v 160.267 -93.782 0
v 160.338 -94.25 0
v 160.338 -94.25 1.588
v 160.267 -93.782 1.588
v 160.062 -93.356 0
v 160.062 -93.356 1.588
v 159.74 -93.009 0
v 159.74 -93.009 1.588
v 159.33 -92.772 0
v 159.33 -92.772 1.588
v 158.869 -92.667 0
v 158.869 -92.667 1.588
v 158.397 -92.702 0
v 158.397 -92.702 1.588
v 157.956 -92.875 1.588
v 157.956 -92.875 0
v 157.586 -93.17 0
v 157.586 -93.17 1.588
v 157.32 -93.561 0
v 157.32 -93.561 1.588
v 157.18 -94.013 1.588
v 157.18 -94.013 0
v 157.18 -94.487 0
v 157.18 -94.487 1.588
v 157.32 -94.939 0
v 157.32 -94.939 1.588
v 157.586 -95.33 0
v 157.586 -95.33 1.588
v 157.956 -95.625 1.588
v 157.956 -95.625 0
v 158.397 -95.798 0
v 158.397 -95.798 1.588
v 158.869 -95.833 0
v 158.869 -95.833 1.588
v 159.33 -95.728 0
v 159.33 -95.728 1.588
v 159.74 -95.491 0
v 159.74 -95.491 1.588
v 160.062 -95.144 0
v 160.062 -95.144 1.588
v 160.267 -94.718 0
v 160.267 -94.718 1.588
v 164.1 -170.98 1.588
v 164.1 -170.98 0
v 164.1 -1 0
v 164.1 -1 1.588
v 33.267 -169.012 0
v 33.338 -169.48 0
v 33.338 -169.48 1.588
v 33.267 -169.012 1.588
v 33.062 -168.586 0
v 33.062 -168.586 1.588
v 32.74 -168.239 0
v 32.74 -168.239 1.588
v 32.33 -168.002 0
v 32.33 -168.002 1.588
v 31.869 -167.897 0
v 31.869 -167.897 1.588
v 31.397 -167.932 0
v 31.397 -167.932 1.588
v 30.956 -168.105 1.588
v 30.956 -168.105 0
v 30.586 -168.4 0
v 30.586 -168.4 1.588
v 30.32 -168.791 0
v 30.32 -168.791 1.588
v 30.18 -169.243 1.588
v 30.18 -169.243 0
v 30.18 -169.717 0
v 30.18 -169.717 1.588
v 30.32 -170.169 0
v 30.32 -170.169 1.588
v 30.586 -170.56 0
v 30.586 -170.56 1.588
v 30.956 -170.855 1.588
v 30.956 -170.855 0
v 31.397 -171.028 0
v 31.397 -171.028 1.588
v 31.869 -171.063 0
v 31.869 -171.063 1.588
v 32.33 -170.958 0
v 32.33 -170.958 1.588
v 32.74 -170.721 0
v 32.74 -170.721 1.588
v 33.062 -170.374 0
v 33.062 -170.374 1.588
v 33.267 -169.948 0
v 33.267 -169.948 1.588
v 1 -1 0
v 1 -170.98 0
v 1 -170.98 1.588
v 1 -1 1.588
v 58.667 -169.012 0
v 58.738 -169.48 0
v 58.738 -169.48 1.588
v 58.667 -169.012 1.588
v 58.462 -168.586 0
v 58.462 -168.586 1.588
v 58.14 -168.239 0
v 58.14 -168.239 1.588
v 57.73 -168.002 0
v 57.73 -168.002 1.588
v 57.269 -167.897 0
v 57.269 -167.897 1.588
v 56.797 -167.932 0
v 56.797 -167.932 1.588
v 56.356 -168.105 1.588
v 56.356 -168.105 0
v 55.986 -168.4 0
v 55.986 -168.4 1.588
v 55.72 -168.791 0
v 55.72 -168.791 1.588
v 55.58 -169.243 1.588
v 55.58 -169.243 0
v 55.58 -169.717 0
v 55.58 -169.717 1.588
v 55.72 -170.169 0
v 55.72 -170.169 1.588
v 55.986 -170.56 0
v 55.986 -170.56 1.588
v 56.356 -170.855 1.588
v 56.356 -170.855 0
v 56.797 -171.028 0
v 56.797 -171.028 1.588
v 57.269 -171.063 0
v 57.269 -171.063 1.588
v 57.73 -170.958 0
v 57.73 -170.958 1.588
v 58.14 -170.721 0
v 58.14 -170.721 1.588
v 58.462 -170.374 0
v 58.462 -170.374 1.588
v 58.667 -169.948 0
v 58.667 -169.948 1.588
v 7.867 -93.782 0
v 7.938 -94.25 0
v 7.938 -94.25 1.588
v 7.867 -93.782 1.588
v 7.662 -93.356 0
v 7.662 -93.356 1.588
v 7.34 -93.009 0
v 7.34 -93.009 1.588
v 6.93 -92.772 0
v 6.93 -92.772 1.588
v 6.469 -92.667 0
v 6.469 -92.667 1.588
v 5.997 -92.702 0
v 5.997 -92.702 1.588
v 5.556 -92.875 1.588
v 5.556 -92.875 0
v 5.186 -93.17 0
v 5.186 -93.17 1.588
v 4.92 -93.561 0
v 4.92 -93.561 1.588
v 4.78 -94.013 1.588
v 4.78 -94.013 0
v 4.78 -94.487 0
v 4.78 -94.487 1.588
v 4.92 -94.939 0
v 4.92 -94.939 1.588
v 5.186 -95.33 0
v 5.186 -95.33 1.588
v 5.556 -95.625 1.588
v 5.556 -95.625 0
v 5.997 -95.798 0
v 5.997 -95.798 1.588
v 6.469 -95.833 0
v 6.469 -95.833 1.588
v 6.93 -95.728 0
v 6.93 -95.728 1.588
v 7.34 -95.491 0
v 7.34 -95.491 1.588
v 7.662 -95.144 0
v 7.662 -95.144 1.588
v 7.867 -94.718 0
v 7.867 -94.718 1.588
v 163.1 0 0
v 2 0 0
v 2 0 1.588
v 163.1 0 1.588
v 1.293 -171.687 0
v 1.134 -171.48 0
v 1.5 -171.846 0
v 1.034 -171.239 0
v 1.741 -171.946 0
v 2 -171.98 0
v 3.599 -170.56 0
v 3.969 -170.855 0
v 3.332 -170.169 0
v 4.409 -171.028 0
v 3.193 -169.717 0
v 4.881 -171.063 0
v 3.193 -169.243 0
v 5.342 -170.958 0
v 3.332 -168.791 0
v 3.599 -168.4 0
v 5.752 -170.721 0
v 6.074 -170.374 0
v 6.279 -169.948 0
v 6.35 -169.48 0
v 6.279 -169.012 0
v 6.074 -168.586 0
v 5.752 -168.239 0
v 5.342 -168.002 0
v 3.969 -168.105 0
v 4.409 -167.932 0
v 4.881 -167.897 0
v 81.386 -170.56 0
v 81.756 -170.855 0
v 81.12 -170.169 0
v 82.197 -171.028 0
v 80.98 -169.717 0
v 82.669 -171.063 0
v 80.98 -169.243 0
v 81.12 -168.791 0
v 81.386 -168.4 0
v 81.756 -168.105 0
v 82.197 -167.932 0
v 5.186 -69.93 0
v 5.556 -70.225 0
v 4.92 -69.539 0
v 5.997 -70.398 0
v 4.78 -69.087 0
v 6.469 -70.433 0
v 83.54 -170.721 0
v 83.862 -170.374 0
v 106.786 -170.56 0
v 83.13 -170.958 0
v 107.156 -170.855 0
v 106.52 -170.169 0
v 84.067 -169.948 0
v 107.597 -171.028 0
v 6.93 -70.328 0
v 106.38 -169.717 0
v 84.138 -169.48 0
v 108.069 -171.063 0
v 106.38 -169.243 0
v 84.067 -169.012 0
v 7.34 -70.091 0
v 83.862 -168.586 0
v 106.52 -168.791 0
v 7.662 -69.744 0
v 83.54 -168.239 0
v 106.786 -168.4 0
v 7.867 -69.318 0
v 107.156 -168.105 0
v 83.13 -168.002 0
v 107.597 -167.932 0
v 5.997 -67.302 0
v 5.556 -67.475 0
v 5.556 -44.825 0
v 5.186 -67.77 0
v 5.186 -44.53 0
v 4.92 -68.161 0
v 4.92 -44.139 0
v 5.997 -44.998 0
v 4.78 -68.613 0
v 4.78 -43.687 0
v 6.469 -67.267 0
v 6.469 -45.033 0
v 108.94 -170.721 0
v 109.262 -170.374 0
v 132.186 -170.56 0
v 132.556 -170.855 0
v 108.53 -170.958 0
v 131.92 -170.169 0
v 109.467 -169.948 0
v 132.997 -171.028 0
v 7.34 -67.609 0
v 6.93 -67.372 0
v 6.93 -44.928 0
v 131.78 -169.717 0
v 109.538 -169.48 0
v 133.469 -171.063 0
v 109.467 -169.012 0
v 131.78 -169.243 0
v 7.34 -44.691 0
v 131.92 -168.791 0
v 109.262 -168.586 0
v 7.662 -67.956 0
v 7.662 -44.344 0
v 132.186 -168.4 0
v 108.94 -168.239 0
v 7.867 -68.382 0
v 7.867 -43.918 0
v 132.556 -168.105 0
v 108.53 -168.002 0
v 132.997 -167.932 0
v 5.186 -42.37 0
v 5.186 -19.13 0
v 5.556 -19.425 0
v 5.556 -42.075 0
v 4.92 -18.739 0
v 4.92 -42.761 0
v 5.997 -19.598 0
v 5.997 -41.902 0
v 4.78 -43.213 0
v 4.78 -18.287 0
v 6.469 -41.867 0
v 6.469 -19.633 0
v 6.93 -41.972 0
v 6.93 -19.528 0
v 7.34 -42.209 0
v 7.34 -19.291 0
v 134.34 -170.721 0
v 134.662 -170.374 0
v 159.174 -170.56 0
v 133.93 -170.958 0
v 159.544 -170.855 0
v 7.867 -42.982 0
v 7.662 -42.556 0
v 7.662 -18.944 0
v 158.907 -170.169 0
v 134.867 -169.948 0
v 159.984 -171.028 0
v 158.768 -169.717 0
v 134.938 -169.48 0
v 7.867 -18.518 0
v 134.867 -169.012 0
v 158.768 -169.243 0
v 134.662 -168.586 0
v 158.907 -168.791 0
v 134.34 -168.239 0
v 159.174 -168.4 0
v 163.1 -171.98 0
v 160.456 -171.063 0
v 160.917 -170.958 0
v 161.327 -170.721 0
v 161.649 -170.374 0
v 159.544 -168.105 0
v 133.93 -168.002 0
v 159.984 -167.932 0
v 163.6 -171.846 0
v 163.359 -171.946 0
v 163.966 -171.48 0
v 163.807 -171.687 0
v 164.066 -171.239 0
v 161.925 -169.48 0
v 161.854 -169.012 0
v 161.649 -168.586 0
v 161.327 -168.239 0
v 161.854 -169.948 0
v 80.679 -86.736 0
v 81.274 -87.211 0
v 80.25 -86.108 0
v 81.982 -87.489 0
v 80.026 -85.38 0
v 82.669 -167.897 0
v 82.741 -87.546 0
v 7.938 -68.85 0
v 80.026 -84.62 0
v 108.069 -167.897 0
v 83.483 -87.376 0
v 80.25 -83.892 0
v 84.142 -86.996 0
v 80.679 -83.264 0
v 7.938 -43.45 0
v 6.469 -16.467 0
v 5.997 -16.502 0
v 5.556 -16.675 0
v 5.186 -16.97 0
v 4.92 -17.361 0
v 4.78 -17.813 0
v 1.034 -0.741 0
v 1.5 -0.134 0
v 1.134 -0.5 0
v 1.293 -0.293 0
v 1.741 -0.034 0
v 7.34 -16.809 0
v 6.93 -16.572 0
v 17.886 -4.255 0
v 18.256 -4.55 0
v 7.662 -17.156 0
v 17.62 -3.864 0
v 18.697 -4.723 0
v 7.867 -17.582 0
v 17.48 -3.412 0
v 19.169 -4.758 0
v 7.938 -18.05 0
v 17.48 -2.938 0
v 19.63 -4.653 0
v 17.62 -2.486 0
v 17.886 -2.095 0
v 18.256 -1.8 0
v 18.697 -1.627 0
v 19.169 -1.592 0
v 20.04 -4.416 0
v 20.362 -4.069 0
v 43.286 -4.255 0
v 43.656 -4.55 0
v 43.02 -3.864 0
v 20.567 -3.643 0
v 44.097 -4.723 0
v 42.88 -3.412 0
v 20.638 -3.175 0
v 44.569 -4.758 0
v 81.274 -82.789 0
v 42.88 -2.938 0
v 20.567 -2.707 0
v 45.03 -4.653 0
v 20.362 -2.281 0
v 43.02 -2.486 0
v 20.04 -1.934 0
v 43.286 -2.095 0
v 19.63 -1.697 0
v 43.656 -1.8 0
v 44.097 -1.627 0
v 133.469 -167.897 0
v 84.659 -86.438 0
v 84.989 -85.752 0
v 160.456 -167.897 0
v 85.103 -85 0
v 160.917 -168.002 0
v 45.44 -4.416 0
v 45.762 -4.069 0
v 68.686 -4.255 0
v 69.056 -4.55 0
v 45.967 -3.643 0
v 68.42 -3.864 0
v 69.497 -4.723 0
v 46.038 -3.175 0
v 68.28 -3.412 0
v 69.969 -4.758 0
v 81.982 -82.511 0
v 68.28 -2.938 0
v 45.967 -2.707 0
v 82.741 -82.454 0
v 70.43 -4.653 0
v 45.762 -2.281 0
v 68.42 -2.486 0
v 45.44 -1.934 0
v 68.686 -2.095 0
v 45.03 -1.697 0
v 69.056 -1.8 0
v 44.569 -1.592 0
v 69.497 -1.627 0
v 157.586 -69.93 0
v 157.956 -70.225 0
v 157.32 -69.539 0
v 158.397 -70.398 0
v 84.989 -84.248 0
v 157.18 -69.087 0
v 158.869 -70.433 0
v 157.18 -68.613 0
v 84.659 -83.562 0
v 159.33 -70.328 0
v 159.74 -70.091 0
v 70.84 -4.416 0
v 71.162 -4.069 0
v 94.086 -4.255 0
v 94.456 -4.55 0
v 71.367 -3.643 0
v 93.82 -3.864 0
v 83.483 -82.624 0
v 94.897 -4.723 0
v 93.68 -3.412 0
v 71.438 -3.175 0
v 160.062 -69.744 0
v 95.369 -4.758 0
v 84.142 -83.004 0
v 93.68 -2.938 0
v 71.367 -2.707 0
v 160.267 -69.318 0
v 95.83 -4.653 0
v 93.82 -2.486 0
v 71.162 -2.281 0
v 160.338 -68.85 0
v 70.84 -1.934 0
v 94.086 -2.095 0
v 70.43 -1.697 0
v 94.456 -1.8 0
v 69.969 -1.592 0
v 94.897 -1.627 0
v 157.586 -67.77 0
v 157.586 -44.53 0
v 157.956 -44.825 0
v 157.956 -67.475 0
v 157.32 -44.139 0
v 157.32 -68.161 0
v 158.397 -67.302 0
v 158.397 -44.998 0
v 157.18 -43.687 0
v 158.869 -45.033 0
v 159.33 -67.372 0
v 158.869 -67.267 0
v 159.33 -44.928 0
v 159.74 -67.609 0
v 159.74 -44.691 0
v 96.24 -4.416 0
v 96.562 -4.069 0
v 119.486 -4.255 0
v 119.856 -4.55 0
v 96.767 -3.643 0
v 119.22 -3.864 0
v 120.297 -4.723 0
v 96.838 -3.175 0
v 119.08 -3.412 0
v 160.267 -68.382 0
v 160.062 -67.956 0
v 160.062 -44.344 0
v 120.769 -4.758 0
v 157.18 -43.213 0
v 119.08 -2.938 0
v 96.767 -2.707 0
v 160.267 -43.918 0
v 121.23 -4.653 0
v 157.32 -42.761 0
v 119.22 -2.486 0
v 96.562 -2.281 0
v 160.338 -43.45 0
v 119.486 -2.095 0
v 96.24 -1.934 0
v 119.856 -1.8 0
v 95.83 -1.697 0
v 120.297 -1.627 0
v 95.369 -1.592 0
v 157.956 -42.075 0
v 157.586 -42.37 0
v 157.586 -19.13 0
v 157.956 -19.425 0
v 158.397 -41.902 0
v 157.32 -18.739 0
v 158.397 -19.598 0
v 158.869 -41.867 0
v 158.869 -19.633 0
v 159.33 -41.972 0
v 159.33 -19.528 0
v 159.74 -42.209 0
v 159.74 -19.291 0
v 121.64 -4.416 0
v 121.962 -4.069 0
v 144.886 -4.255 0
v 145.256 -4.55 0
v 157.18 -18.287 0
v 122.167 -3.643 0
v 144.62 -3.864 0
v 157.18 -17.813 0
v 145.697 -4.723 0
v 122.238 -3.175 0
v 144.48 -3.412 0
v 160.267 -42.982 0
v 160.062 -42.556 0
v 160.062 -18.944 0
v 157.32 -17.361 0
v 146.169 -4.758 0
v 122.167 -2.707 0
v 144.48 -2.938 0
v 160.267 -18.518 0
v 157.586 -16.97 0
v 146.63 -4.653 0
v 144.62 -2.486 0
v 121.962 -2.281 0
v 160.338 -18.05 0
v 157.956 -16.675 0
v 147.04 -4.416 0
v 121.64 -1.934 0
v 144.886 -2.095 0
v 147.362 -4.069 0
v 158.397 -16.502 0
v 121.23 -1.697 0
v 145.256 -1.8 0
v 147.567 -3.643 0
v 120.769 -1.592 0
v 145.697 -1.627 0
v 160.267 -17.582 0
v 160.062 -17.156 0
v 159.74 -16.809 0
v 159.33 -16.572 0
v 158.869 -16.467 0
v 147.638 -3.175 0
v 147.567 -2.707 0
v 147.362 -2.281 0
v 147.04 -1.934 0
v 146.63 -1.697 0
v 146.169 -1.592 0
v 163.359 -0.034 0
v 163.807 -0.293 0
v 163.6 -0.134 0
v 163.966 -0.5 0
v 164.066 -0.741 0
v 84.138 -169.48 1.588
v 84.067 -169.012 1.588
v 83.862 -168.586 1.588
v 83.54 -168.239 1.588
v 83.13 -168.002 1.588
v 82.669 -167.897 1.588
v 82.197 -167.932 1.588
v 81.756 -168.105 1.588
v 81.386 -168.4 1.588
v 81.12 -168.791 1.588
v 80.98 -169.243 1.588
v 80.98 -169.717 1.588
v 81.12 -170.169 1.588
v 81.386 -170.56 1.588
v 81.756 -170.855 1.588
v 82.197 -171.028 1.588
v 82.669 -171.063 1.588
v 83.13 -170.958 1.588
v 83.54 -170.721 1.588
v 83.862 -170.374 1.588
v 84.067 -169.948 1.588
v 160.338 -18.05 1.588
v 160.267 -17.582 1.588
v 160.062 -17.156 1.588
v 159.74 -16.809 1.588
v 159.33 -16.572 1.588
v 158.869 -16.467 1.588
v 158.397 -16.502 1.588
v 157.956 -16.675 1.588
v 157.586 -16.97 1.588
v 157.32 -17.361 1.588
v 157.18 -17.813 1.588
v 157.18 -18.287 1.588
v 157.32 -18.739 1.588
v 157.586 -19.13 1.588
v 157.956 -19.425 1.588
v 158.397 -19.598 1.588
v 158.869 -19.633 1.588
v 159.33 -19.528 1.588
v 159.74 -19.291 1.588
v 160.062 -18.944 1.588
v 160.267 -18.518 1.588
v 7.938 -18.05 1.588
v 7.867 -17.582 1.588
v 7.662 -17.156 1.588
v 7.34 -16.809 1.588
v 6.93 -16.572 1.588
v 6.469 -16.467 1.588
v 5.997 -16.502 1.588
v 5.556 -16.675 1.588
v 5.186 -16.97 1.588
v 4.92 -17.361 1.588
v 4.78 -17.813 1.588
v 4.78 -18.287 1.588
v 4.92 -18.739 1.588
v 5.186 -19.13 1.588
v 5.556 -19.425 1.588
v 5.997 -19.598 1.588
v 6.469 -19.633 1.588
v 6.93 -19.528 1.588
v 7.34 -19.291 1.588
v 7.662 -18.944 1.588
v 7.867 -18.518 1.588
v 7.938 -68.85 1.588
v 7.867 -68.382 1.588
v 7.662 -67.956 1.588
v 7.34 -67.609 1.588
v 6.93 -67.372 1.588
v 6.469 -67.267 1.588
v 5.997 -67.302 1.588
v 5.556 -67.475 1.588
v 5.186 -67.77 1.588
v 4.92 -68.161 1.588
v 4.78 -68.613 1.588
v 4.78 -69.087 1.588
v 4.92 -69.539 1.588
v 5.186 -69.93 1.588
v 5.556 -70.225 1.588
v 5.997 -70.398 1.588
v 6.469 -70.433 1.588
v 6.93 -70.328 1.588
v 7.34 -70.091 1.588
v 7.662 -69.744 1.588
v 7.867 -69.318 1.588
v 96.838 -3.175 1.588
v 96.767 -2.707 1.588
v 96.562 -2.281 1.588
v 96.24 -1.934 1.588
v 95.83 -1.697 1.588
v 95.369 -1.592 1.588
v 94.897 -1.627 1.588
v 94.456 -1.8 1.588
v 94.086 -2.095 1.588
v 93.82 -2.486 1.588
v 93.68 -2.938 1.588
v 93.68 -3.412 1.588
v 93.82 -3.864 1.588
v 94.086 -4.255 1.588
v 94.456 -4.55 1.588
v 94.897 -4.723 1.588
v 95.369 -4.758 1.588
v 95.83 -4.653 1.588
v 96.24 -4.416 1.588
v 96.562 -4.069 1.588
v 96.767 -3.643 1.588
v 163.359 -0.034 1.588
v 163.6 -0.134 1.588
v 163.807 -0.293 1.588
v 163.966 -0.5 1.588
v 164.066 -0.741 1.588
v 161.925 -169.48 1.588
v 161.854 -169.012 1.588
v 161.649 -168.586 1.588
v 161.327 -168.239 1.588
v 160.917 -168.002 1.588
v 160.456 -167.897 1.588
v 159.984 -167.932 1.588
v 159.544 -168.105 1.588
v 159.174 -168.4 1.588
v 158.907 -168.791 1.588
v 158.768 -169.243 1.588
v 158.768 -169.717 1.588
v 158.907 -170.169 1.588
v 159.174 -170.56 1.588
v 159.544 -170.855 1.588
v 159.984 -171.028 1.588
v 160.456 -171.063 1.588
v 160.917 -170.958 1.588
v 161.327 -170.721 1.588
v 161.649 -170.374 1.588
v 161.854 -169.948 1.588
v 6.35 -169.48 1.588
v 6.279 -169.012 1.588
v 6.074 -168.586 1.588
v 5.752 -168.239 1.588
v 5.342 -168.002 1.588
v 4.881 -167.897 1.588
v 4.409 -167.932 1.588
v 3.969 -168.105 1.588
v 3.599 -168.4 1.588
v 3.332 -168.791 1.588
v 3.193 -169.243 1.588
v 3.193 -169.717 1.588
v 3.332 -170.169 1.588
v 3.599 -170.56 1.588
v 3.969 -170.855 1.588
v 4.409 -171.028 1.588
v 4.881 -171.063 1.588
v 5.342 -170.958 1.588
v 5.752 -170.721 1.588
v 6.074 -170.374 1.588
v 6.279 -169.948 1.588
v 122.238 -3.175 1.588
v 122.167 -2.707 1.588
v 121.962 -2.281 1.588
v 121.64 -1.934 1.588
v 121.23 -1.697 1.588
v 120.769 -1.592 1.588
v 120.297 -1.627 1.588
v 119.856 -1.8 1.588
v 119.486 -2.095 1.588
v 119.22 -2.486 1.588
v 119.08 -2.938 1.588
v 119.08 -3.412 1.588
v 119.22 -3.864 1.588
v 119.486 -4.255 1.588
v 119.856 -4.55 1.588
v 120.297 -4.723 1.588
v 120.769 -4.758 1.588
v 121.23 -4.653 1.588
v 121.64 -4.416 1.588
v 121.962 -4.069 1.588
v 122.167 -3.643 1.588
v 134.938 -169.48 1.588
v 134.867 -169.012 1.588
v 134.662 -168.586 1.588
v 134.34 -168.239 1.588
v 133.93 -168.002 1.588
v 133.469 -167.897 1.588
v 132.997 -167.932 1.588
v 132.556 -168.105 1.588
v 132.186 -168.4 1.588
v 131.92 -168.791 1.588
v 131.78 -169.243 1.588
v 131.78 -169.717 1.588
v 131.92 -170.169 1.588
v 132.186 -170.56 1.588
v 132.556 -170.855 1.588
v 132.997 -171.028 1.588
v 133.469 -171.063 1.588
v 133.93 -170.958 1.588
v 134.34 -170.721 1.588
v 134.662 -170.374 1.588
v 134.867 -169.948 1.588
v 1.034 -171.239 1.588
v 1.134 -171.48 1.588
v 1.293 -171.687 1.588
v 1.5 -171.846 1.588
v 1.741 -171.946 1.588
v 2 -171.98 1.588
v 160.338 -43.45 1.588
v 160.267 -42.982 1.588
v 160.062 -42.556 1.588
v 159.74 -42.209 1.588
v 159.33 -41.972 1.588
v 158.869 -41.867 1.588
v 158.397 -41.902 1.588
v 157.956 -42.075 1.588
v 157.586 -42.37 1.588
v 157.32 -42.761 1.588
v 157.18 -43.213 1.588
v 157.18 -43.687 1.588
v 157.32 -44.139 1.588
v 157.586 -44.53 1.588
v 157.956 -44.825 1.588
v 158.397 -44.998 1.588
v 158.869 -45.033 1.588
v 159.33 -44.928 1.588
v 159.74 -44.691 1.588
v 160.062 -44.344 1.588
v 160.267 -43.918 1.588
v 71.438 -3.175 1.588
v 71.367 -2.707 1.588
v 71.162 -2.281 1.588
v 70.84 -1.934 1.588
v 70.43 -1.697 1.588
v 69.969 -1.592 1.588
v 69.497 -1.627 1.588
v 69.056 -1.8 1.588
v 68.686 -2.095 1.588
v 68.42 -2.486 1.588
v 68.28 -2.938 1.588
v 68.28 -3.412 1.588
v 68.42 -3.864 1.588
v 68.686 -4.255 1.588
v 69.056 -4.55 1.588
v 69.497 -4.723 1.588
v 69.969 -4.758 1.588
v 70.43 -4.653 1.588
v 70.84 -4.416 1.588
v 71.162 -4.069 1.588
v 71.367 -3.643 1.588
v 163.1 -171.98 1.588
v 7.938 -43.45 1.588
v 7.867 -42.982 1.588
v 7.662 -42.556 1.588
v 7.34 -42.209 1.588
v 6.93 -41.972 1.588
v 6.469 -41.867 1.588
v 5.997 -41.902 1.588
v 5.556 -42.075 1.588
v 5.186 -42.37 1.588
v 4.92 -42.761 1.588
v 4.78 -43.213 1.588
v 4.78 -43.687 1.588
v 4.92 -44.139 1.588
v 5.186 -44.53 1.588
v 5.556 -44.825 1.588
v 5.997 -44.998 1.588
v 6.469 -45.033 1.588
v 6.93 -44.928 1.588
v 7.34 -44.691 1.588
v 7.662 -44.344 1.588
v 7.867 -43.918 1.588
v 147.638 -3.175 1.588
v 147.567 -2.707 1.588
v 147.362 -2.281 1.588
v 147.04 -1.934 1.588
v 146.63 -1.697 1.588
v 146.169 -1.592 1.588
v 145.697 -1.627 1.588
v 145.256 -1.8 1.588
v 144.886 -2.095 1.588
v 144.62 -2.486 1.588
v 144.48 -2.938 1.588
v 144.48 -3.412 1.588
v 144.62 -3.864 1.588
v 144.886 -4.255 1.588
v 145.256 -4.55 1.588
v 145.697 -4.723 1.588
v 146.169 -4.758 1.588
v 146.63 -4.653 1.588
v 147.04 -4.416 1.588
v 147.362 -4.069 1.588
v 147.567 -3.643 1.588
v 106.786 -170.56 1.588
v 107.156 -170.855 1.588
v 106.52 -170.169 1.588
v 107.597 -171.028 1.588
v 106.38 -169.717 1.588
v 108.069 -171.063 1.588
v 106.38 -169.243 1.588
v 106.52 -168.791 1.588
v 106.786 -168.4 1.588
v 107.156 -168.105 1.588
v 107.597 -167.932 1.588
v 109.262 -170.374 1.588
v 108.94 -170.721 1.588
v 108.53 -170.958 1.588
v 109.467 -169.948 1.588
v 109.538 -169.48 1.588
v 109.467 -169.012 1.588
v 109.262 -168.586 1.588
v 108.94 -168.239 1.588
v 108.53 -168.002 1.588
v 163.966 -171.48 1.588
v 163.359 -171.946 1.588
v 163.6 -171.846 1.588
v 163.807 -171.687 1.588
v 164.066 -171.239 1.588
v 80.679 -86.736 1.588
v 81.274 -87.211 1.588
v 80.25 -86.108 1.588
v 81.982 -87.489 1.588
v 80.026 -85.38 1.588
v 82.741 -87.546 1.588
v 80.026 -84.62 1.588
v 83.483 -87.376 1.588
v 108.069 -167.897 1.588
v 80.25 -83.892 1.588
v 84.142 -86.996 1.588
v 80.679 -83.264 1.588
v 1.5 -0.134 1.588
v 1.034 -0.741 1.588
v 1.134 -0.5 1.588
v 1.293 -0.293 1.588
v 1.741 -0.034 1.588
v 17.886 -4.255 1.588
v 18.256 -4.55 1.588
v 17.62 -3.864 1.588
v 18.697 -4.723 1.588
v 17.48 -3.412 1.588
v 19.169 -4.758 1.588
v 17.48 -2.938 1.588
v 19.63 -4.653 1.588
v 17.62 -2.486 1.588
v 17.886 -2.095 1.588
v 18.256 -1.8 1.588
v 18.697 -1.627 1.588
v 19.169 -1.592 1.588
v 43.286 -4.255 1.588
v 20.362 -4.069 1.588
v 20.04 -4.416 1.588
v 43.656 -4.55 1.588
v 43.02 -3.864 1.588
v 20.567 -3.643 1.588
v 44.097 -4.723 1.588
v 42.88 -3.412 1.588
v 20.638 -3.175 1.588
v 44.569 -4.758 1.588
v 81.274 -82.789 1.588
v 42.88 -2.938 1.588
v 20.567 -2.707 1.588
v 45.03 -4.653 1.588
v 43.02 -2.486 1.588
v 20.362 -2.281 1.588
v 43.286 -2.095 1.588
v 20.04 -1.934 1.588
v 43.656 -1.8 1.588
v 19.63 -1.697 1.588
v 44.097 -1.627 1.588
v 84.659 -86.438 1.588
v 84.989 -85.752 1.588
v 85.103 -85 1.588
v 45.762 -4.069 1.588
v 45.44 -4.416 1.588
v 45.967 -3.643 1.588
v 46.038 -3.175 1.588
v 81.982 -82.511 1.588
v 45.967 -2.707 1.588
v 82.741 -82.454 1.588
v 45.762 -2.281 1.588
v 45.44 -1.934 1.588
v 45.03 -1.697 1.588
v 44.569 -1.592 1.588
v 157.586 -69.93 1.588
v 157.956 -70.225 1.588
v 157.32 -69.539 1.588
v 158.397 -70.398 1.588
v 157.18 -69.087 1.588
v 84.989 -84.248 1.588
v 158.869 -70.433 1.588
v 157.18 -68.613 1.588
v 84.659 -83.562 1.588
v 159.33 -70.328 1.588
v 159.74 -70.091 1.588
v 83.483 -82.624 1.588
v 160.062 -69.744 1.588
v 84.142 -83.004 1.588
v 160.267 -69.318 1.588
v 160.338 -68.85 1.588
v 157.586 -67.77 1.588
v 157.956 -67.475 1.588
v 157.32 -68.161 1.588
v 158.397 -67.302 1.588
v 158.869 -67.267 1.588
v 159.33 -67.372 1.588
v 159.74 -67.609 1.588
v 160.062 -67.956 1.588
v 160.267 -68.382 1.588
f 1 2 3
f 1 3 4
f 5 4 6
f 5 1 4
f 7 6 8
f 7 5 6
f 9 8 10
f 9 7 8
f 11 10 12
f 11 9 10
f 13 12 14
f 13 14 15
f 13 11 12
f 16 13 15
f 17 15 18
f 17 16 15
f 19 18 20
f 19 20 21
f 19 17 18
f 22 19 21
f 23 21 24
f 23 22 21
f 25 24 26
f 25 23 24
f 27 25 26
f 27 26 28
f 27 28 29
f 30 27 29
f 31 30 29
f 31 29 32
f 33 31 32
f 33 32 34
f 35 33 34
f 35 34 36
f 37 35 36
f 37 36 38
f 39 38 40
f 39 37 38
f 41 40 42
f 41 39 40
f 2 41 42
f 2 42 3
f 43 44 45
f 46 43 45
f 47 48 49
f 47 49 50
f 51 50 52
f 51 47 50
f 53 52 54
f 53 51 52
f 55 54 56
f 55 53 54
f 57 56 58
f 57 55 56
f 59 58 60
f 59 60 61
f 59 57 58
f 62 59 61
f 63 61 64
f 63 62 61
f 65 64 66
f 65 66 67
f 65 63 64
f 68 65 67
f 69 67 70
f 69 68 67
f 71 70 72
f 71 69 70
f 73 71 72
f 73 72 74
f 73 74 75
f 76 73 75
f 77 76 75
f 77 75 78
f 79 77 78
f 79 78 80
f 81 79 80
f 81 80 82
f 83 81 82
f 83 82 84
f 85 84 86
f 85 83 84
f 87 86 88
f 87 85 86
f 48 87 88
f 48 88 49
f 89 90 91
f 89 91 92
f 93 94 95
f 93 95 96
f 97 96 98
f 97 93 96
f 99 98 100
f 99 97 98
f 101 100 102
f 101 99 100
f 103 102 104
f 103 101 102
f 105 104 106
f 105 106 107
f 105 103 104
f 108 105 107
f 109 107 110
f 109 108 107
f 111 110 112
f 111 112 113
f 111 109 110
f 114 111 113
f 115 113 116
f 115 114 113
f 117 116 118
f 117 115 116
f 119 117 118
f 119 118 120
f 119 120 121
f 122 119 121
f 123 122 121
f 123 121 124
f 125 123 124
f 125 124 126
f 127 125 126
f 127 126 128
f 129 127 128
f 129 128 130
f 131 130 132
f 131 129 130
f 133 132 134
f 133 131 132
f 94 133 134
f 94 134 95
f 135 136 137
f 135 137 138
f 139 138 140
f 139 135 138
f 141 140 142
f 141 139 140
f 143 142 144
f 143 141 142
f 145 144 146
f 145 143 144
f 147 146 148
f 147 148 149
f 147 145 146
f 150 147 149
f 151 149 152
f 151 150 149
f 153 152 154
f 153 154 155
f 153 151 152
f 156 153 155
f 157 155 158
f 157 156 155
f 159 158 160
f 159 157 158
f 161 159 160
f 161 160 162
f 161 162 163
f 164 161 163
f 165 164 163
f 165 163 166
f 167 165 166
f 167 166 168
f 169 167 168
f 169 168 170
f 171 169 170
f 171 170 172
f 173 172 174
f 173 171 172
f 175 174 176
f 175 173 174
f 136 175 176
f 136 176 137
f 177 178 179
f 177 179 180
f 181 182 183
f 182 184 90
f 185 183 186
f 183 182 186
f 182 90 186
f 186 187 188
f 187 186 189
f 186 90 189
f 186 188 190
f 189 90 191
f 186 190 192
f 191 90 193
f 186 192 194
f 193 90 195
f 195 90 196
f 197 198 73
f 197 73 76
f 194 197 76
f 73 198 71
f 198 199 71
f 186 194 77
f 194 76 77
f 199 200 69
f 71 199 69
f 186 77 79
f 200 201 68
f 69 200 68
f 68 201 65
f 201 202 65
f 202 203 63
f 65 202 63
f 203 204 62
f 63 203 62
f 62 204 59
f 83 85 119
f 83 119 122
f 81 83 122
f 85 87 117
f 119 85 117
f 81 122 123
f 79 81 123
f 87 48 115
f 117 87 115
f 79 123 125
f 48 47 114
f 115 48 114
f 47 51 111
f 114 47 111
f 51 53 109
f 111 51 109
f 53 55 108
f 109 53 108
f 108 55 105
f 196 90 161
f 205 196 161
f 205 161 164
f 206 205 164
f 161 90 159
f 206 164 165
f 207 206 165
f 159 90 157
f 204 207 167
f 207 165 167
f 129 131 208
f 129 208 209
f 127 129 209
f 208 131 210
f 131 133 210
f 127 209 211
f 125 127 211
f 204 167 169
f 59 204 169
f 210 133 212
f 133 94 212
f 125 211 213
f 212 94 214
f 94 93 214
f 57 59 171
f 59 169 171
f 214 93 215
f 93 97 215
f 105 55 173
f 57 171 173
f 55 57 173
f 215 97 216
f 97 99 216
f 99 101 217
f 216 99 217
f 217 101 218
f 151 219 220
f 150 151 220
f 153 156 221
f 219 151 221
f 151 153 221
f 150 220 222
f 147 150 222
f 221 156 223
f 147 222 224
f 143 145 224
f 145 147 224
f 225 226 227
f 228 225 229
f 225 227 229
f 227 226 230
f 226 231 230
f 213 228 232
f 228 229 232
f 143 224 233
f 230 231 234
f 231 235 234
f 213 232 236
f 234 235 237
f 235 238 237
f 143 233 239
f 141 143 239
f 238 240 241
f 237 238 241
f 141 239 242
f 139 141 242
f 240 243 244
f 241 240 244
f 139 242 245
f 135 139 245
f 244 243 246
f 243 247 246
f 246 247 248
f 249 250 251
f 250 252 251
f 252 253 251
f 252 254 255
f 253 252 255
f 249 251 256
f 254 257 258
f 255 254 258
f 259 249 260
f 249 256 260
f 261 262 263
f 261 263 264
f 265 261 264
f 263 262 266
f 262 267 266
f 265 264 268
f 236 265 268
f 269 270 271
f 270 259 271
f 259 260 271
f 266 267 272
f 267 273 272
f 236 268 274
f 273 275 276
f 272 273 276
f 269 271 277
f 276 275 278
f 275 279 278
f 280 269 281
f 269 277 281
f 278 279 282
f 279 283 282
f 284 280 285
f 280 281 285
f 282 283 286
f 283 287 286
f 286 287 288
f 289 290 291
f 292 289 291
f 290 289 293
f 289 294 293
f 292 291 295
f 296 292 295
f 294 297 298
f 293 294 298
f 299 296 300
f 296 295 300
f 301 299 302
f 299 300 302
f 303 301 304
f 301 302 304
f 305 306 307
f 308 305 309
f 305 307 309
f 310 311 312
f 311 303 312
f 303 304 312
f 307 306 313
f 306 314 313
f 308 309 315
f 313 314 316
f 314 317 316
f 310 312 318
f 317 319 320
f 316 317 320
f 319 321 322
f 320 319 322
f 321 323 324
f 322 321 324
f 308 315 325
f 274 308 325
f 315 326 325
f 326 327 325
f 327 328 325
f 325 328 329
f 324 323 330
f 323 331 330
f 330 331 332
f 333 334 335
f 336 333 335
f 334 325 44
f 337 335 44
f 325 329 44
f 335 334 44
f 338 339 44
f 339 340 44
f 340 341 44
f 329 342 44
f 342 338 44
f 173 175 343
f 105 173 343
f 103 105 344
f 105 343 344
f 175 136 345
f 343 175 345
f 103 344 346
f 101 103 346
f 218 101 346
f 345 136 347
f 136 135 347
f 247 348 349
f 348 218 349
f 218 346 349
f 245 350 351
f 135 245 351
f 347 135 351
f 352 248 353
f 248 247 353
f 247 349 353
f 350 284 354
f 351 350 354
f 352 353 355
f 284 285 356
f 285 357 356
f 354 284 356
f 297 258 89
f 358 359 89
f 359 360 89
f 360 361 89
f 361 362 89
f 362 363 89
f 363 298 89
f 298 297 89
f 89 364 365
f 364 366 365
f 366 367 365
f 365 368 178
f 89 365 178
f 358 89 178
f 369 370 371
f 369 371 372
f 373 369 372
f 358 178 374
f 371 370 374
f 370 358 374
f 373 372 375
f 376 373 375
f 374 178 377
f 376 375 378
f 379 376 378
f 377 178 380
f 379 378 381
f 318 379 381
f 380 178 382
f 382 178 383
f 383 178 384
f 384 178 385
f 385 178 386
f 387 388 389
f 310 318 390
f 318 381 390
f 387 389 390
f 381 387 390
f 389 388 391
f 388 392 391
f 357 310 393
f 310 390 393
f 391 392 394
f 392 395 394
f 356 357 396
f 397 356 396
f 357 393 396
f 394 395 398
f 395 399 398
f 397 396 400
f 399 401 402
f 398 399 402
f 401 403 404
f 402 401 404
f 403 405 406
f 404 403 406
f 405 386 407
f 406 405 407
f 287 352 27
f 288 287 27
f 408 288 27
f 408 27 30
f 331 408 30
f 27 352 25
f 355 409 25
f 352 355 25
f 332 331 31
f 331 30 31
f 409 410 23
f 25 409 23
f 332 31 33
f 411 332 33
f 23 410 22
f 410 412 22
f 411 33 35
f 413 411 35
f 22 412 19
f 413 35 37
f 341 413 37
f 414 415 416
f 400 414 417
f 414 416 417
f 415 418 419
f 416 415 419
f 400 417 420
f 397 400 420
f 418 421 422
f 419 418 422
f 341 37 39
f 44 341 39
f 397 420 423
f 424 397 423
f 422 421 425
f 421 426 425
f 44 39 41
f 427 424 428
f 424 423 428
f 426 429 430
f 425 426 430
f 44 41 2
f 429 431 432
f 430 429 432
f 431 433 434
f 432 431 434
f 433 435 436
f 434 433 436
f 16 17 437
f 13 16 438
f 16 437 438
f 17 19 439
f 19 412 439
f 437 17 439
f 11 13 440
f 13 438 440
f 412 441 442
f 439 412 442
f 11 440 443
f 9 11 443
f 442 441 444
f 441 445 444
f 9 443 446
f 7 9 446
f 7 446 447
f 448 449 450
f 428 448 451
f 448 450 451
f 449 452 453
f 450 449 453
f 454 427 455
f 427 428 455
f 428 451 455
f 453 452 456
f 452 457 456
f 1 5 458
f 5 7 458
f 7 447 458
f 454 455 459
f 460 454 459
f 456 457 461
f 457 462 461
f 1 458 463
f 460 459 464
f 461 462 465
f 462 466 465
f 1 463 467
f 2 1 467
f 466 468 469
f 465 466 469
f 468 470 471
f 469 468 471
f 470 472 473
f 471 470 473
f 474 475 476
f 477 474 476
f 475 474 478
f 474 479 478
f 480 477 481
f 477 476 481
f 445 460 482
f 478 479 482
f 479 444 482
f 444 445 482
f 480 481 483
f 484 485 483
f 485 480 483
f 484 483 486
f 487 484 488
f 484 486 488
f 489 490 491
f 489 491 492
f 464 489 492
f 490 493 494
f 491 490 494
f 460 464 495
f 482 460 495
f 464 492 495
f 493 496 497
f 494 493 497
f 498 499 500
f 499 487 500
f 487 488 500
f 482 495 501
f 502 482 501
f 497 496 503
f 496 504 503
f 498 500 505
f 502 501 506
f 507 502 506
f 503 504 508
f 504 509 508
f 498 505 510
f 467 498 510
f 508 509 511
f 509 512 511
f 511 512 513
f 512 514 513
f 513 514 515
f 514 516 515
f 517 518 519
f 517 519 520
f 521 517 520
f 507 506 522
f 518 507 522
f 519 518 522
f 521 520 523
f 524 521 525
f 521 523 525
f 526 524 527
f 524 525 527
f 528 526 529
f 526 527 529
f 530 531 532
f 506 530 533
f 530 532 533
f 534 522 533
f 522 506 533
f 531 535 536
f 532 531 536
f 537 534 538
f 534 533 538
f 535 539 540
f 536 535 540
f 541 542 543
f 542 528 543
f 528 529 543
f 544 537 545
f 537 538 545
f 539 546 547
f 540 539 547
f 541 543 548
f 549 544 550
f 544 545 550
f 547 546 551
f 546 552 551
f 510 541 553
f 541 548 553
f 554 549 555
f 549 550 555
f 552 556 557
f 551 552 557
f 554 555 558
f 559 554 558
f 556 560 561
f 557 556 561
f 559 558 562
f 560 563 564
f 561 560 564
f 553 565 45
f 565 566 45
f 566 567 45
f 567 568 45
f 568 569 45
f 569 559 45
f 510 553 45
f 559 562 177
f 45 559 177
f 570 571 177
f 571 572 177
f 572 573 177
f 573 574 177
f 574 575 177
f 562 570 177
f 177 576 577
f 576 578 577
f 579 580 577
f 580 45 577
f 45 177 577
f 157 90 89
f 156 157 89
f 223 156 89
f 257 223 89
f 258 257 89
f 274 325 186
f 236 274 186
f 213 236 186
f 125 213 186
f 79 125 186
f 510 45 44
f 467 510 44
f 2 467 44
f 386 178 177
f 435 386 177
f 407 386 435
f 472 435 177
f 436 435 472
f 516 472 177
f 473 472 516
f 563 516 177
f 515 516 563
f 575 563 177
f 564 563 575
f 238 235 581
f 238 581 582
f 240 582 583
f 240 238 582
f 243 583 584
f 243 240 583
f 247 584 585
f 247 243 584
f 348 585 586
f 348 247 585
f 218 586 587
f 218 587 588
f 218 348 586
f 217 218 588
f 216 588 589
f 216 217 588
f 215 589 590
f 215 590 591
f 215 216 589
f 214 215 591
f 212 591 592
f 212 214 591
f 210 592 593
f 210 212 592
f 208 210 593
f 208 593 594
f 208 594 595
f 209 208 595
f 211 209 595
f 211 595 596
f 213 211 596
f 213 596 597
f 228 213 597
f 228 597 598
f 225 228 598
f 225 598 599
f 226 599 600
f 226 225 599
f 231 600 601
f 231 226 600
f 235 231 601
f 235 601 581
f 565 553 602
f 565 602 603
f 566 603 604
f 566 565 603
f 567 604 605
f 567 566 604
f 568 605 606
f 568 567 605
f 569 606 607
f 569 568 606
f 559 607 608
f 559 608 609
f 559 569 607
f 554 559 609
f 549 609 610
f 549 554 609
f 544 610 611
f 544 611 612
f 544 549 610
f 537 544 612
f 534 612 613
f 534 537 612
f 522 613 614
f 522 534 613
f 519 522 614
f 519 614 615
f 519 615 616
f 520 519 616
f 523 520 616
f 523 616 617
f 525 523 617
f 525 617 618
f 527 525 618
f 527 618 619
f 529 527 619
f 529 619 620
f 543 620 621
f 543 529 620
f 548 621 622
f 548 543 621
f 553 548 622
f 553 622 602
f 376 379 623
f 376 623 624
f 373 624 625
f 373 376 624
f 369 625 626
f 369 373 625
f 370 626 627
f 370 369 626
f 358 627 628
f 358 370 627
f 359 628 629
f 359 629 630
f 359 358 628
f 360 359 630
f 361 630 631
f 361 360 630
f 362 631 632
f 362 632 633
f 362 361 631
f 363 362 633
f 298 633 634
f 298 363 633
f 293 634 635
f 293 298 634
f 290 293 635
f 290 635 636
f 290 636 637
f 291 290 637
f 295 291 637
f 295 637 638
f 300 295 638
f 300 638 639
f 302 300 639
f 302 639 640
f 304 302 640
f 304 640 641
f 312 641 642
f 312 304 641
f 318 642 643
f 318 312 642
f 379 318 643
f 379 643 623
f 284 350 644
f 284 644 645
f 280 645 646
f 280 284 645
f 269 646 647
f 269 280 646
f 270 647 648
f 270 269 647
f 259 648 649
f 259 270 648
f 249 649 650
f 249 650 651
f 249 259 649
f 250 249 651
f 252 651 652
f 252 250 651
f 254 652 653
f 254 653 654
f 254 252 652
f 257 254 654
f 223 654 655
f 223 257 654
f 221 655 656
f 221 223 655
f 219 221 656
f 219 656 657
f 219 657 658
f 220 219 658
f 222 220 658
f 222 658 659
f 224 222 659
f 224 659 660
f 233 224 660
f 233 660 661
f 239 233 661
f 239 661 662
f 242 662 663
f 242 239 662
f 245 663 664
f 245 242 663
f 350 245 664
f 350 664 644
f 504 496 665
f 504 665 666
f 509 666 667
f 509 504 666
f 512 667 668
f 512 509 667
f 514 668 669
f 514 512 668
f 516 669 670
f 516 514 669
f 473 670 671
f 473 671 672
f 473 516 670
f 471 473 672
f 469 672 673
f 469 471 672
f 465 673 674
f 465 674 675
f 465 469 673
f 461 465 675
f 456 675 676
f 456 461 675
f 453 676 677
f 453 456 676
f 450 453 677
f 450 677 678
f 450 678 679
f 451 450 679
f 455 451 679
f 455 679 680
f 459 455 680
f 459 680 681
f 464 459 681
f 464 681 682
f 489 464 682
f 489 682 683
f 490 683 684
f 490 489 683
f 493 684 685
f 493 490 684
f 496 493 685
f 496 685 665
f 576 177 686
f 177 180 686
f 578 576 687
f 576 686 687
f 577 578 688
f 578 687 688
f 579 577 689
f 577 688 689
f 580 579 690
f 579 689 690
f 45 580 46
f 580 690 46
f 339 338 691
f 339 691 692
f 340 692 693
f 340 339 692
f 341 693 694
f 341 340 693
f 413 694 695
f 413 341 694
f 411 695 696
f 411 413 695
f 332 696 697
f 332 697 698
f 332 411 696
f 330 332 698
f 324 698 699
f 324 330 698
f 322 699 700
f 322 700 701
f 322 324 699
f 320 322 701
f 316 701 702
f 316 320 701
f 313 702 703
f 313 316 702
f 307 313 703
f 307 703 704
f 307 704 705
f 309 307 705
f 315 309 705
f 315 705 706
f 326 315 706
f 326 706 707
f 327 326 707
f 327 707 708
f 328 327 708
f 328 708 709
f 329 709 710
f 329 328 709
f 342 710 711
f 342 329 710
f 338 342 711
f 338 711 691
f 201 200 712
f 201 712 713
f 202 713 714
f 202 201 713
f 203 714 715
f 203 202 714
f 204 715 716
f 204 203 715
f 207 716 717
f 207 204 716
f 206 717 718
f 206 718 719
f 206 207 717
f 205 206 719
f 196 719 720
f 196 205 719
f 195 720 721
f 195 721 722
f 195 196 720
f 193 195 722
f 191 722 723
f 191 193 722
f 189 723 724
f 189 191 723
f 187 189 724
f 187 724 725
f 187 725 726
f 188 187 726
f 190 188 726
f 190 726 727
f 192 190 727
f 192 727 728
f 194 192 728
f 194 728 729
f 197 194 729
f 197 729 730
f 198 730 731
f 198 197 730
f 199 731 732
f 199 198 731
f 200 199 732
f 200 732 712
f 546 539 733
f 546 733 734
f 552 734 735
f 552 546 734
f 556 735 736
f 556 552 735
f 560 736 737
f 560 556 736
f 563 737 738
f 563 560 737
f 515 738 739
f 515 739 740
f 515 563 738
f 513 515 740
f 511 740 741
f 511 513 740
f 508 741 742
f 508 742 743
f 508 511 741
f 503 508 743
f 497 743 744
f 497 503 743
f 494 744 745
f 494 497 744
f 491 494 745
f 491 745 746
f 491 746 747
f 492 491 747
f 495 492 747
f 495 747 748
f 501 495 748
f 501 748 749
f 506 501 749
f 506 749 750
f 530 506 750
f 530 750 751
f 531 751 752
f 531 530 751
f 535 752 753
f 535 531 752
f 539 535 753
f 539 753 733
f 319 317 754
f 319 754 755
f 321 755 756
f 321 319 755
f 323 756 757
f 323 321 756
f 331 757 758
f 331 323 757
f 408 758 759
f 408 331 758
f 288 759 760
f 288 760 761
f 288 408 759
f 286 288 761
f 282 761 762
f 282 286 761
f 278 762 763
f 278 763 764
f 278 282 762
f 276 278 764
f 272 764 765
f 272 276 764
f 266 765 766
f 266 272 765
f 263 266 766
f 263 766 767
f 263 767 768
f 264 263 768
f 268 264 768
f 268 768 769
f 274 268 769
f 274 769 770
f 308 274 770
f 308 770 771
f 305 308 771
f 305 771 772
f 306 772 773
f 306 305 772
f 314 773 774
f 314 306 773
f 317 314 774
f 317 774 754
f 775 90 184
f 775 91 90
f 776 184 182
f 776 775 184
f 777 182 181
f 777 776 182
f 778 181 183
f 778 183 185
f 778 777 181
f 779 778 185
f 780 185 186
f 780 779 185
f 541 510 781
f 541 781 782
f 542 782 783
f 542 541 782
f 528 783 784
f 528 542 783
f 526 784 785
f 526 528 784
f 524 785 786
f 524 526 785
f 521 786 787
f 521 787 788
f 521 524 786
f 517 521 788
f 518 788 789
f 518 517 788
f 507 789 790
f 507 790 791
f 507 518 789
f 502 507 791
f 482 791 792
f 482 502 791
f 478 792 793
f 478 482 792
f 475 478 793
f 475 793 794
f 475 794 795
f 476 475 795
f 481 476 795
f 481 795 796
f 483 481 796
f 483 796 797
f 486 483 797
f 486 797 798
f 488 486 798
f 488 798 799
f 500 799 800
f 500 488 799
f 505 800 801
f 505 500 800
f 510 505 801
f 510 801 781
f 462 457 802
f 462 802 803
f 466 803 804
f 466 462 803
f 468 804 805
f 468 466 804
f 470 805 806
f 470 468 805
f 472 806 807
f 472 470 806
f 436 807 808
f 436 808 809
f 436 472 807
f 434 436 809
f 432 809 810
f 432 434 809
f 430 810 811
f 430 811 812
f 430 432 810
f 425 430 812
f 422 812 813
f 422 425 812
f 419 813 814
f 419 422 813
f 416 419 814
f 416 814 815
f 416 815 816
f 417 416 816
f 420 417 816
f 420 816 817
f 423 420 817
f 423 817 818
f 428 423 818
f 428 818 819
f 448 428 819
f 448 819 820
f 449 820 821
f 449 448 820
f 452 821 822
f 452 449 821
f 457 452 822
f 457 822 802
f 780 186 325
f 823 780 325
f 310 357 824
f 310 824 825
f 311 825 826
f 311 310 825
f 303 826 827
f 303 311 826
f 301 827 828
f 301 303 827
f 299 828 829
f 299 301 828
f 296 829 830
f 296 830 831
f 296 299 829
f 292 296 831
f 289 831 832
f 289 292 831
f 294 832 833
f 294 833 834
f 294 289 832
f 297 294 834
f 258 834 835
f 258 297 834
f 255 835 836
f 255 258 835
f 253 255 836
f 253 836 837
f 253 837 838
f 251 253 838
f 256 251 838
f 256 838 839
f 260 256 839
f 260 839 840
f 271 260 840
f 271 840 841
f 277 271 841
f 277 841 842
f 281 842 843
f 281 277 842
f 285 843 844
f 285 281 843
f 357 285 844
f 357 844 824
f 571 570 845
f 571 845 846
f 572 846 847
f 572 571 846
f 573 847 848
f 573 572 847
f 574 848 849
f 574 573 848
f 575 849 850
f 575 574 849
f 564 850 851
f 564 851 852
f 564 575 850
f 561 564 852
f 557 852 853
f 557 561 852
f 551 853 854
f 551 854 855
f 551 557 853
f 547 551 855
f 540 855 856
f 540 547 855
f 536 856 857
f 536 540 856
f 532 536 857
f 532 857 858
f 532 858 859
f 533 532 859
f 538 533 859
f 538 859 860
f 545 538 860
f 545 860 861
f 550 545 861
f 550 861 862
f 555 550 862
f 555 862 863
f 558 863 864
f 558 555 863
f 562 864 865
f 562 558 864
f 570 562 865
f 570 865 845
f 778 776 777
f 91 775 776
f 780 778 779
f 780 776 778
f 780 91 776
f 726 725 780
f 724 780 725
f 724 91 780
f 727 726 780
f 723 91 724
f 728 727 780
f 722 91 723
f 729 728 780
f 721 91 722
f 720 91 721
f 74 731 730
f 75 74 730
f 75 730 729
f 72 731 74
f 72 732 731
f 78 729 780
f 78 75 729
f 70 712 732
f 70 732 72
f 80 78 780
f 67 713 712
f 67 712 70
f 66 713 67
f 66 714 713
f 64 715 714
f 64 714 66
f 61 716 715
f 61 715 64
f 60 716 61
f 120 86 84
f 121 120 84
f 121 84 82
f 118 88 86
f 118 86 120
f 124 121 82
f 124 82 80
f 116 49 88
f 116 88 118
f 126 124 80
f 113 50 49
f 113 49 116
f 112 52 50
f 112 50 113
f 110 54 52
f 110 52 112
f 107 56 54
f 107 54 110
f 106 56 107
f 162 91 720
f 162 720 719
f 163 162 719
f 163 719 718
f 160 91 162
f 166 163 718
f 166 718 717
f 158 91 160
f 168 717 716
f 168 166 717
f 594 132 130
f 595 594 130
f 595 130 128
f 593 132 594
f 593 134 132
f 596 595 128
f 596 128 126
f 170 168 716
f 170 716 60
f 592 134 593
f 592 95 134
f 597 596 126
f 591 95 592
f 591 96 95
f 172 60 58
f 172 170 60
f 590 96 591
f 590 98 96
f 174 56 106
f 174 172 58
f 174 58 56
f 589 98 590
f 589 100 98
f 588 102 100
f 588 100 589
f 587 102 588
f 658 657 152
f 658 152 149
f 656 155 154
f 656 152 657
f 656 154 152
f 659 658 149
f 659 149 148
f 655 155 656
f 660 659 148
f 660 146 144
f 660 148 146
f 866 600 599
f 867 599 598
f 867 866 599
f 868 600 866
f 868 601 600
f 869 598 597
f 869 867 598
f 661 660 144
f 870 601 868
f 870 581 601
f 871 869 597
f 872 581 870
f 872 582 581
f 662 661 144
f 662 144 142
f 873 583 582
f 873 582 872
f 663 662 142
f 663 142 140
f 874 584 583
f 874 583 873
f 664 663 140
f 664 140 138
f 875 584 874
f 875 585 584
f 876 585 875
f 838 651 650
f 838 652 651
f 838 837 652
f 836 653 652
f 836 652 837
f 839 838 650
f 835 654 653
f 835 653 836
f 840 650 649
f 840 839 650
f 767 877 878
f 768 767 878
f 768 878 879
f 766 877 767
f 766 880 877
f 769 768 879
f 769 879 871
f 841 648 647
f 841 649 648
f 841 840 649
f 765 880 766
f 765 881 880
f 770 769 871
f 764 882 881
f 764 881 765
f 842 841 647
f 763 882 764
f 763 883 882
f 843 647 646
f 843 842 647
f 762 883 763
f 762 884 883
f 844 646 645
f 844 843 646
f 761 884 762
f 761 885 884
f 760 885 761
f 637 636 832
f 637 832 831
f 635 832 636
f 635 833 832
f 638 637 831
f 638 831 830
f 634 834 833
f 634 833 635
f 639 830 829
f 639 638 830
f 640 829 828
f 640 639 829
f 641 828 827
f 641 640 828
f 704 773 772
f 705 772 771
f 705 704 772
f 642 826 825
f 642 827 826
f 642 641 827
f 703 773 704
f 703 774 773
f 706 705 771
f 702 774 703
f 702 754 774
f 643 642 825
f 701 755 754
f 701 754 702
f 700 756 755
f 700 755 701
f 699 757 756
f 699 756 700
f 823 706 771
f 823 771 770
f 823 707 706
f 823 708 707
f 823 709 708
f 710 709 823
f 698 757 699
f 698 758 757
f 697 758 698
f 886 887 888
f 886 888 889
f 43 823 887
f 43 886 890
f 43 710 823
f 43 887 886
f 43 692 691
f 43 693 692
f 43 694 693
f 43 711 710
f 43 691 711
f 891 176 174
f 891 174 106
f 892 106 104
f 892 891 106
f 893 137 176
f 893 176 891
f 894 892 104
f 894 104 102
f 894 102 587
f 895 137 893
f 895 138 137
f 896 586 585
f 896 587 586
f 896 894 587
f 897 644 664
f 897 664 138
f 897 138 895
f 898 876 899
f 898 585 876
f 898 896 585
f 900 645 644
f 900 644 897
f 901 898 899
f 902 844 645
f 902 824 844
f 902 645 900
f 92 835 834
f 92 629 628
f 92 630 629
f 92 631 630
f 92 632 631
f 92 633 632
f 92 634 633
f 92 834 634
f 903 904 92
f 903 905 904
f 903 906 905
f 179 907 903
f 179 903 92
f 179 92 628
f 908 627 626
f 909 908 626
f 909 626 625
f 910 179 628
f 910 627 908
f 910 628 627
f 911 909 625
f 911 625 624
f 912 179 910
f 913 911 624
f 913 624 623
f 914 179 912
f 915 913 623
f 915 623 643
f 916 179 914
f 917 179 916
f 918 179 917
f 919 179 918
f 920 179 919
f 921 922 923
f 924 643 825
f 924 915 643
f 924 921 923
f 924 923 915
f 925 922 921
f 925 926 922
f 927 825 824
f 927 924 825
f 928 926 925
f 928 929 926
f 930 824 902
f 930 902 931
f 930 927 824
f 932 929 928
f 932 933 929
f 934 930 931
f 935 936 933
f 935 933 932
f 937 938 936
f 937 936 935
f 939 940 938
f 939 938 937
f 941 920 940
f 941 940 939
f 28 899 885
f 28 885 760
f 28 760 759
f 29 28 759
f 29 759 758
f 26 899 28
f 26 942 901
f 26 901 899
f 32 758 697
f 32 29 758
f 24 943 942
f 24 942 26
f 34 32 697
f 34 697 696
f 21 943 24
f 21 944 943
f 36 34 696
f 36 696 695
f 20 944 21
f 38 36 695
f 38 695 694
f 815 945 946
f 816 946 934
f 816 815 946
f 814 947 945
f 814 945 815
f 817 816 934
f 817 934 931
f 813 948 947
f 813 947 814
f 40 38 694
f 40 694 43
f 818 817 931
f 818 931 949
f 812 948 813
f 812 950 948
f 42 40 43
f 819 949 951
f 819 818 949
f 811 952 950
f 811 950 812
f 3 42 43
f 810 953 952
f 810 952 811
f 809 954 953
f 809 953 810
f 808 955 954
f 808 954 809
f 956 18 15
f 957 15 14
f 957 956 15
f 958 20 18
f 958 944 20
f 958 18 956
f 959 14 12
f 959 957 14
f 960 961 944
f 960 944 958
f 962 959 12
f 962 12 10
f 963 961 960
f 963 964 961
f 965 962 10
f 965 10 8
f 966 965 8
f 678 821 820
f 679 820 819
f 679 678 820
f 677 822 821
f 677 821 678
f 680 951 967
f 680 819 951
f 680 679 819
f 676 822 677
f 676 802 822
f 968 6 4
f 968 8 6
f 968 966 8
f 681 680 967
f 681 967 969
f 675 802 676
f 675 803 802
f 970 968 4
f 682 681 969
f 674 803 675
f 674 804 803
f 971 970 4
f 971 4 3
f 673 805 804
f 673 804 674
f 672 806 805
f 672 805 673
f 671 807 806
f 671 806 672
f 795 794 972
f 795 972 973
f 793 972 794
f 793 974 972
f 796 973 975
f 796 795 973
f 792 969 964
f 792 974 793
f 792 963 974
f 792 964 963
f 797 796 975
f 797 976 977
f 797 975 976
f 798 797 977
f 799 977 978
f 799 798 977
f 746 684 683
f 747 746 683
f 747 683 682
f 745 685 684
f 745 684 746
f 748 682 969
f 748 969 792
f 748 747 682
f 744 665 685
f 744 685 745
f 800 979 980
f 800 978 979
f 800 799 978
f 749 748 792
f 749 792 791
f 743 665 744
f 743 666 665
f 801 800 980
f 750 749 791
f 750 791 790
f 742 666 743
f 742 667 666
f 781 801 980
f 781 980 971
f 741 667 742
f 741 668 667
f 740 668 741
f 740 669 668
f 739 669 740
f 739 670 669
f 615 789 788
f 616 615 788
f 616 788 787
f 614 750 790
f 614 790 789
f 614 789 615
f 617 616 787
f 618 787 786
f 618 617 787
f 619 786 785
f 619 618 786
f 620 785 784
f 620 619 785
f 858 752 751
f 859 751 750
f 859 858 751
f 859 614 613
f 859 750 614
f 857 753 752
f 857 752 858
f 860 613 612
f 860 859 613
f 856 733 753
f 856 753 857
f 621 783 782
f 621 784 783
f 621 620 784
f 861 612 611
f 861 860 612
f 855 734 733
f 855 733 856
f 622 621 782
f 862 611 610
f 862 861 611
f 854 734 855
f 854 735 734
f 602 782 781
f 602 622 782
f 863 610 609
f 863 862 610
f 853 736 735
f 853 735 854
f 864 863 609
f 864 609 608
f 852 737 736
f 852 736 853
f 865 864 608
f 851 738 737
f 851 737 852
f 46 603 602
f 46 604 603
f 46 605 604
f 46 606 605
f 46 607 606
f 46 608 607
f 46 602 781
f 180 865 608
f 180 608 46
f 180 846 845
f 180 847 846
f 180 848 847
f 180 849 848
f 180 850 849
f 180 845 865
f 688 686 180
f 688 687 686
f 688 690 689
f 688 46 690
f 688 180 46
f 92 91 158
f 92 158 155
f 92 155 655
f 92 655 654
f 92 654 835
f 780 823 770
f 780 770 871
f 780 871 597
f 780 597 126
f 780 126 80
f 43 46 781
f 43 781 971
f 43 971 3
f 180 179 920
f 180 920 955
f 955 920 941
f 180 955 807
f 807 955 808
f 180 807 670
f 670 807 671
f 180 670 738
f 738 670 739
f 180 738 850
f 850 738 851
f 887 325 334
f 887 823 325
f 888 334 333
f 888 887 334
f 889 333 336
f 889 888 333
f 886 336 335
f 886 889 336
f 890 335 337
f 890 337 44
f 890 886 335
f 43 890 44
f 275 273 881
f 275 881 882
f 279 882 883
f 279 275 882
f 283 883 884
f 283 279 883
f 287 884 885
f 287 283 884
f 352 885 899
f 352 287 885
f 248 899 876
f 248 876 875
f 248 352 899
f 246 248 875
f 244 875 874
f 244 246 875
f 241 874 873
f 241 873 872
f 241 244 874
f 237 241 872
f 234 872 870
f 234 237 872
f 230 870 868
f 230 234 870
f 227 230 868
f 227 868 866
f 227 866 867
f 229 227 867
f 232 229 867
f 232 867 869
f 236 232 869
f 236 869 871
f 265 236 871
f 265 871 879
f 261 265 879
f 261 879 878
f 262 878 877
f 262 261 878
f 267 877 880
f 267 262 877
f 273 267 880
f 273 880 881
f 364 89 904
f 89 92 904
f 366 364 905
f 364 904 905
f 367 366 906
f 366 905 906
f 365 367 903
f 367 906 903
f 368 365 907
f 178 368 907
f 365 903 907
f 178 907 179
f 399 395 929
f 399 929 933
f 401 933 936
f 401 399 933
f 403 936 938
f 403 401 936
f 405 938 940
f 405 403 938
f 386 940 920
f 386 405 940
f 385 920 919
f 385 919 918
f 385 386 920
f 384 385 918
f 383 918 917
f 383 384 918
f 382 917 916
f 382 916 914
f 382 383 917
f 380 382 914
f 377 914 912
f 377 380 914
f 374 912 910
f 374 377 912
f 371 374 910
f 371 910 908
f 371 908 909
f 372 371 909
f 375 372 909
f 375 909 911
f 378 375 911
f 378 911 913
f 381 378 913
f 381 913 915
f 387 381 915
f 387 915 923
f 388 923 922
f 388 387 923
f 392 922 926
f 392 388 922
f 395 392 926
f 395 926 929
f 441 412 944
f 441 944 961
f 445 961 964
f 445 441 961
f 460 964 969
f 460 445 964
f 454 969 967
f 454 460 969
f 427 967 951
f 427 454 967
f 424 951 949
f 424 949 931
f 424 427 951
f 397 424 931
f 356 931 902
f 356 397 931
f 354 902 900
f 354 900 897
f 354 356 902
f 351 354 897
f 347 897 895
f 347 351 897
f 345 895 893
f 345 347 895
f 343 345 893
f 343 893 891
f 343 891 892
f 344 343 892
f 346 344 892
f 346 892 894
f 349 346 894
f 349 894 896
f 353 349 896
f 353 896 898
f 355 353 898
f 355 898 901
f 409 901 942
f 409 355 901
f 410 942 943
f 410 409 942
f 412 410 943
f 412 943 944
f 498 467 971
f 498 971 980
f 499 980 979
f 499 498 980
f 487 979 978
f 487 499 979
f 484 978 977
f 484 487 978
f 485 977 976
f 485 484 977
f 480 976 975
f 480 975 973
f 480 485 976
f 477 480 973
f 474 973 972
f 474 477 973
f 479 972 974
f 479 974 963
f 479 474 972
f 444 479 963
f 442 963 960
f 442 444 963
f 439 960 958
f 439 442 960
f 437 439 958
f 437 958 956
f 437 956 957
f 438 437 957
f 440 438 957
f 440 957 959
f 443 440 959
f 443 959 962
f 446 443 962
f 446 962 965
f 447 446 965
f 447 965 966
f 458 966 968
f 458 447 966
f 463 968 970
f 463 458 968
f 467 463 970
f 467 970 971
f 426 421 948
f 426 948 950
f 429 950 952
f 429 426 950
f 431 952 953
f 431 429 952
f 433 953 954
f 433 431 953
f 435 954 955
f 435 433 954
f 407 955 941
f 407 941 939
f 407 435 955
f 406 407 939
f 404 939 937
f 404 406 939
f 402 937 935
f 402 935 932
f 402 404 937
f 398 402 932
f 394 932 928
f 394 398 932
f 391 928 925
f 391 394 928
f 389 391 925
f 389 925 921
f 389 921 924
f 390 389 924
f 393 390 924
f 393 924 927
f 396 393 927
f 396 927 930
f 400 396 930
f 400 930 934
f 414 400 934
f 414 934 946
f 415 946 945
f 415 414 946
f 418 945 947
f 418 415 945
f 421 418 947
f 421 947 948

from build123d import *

# Parameters (mm, degrees)
SKETCH2_W           = 163.1
SKETCH2_H           = 171.98
SKETCH2_R           = 2.5527
SKETCH2_R_2         = 1.5875
BOSS_EXTRUDE2_DEPTH = 1.5875
FILLET1_R           = 1


with BuildPart() as part:
    # Sketch2 → Boss-Extrude2 (new body)
    with BuildSketch(Plane.XY):
        with Locations((82.55, -85.99)):
            Rectangle(SKETCH2_W, SKETCH2_H)
        with Locations((82.55, -85)):
            Circle(SKETCH2_R, mode=Mode.SUBTRACT)
        with Locations((82.55, -169.48)):
            Circle(SKETCH2_R_2, mode=Mode.SUBTRACT)
        with Locations((4.7625, -169.48)):
            Circle(SKETCH2_R_2, mode=Mode.SUBTRACT)
        with Locations((31.75, -169.48)):
            Circle(SKETCH2_R_2, mode=Mode.SUBTRACT)
        with Locations((57.15, -169.48)):
            Circle(SKETCH2_R_2, mode=Mode.SUBTRACT)
        with Locations((6.35, -94.25)):
            Circle(SKETCH2_R_2, mode=Mode.SUBTRACT)
        with Locations((6.35, -68.85)):
            Circle(SKETCH2_R_2, mode=Mode.SUBTRACT)
        with Locations((6.35, -43.45)):
            Circle(SKETCH2_R_2, mode=Mode.SUBTRACT)
        with Locations((6.35, -18.05)):
            Circle(SKETCH2_R_2, mode=Mode.SUBTRACT)
        with Locations((19.05, -3.175)):
            Circle(SKETCH2_R_2, mode=Mode.SUBTRACT)
        with Locations((44.45, -3.175)):
            Circle(SKETCH2_R_2, mode=Mode.SUBTRACT)
        with Locations((69.85, -3.175)):
            Circle(SKETCH2_R_2, mode=Mode.SUBTRACT)
        with Locations((158.75, -43.45)):
            Circle(SKETCH2_R_2, mode=Mode.SUBTRACT)
        with Locations((158.75, -18.05)):
            Circle(SKETCH2_R_2, mode=Mode.SUBTRACT)
        with Locations((146.05, -3.175)):
            Circle(SKETCH2_R_2, mode=Mode.SUBTRACT)
        with Locations((107.95, -169.48)):
            Circle(SKETCH2_R_2, mode=Mode.SUBTRACT)
        with Locations((133.35, -169.48)):
            Circle(SKETCH2_R_2, mode=Mode.SUBTRACT)
        with Locations((160.3375, -169.48)):
            Circle(SKETCH2_R_2, mode=Mode.SUBTRACT)
        with Locations((158.75, -94.25)):
            Circle(SKETCH2_R_2, mode=Mode.SUBTRACT)
        with Locations((158.75, -68.85)):
            Circle(SKETCH2_R_2, mode=Mode.SUBTRACT)
        with Locations((95.25, -3.175)):
            Circle(SKETCH2_R_2, mode=Mode.SUBTRACT)
        with Locations((120.65, -3.175)):
            Circle(SKETCH2_R_2, mode=Mode.SUBTRACT)
    extrude(amount=BOSS_EXTRUDE2_DEPTH)

    # Fillet1
    fillet1_edges = [part.edges().sort_by_distance(p)[0] for p in [
        (1, -171.98, 0.79375),
        (1, 0, 0.79375),
        (164.1, 0, 0.79375),
        (164.1, -171.98, 0.79375),
    ]]
    fillet(fillet1_edges, radius=FILLET1_R)


solid = part.part
